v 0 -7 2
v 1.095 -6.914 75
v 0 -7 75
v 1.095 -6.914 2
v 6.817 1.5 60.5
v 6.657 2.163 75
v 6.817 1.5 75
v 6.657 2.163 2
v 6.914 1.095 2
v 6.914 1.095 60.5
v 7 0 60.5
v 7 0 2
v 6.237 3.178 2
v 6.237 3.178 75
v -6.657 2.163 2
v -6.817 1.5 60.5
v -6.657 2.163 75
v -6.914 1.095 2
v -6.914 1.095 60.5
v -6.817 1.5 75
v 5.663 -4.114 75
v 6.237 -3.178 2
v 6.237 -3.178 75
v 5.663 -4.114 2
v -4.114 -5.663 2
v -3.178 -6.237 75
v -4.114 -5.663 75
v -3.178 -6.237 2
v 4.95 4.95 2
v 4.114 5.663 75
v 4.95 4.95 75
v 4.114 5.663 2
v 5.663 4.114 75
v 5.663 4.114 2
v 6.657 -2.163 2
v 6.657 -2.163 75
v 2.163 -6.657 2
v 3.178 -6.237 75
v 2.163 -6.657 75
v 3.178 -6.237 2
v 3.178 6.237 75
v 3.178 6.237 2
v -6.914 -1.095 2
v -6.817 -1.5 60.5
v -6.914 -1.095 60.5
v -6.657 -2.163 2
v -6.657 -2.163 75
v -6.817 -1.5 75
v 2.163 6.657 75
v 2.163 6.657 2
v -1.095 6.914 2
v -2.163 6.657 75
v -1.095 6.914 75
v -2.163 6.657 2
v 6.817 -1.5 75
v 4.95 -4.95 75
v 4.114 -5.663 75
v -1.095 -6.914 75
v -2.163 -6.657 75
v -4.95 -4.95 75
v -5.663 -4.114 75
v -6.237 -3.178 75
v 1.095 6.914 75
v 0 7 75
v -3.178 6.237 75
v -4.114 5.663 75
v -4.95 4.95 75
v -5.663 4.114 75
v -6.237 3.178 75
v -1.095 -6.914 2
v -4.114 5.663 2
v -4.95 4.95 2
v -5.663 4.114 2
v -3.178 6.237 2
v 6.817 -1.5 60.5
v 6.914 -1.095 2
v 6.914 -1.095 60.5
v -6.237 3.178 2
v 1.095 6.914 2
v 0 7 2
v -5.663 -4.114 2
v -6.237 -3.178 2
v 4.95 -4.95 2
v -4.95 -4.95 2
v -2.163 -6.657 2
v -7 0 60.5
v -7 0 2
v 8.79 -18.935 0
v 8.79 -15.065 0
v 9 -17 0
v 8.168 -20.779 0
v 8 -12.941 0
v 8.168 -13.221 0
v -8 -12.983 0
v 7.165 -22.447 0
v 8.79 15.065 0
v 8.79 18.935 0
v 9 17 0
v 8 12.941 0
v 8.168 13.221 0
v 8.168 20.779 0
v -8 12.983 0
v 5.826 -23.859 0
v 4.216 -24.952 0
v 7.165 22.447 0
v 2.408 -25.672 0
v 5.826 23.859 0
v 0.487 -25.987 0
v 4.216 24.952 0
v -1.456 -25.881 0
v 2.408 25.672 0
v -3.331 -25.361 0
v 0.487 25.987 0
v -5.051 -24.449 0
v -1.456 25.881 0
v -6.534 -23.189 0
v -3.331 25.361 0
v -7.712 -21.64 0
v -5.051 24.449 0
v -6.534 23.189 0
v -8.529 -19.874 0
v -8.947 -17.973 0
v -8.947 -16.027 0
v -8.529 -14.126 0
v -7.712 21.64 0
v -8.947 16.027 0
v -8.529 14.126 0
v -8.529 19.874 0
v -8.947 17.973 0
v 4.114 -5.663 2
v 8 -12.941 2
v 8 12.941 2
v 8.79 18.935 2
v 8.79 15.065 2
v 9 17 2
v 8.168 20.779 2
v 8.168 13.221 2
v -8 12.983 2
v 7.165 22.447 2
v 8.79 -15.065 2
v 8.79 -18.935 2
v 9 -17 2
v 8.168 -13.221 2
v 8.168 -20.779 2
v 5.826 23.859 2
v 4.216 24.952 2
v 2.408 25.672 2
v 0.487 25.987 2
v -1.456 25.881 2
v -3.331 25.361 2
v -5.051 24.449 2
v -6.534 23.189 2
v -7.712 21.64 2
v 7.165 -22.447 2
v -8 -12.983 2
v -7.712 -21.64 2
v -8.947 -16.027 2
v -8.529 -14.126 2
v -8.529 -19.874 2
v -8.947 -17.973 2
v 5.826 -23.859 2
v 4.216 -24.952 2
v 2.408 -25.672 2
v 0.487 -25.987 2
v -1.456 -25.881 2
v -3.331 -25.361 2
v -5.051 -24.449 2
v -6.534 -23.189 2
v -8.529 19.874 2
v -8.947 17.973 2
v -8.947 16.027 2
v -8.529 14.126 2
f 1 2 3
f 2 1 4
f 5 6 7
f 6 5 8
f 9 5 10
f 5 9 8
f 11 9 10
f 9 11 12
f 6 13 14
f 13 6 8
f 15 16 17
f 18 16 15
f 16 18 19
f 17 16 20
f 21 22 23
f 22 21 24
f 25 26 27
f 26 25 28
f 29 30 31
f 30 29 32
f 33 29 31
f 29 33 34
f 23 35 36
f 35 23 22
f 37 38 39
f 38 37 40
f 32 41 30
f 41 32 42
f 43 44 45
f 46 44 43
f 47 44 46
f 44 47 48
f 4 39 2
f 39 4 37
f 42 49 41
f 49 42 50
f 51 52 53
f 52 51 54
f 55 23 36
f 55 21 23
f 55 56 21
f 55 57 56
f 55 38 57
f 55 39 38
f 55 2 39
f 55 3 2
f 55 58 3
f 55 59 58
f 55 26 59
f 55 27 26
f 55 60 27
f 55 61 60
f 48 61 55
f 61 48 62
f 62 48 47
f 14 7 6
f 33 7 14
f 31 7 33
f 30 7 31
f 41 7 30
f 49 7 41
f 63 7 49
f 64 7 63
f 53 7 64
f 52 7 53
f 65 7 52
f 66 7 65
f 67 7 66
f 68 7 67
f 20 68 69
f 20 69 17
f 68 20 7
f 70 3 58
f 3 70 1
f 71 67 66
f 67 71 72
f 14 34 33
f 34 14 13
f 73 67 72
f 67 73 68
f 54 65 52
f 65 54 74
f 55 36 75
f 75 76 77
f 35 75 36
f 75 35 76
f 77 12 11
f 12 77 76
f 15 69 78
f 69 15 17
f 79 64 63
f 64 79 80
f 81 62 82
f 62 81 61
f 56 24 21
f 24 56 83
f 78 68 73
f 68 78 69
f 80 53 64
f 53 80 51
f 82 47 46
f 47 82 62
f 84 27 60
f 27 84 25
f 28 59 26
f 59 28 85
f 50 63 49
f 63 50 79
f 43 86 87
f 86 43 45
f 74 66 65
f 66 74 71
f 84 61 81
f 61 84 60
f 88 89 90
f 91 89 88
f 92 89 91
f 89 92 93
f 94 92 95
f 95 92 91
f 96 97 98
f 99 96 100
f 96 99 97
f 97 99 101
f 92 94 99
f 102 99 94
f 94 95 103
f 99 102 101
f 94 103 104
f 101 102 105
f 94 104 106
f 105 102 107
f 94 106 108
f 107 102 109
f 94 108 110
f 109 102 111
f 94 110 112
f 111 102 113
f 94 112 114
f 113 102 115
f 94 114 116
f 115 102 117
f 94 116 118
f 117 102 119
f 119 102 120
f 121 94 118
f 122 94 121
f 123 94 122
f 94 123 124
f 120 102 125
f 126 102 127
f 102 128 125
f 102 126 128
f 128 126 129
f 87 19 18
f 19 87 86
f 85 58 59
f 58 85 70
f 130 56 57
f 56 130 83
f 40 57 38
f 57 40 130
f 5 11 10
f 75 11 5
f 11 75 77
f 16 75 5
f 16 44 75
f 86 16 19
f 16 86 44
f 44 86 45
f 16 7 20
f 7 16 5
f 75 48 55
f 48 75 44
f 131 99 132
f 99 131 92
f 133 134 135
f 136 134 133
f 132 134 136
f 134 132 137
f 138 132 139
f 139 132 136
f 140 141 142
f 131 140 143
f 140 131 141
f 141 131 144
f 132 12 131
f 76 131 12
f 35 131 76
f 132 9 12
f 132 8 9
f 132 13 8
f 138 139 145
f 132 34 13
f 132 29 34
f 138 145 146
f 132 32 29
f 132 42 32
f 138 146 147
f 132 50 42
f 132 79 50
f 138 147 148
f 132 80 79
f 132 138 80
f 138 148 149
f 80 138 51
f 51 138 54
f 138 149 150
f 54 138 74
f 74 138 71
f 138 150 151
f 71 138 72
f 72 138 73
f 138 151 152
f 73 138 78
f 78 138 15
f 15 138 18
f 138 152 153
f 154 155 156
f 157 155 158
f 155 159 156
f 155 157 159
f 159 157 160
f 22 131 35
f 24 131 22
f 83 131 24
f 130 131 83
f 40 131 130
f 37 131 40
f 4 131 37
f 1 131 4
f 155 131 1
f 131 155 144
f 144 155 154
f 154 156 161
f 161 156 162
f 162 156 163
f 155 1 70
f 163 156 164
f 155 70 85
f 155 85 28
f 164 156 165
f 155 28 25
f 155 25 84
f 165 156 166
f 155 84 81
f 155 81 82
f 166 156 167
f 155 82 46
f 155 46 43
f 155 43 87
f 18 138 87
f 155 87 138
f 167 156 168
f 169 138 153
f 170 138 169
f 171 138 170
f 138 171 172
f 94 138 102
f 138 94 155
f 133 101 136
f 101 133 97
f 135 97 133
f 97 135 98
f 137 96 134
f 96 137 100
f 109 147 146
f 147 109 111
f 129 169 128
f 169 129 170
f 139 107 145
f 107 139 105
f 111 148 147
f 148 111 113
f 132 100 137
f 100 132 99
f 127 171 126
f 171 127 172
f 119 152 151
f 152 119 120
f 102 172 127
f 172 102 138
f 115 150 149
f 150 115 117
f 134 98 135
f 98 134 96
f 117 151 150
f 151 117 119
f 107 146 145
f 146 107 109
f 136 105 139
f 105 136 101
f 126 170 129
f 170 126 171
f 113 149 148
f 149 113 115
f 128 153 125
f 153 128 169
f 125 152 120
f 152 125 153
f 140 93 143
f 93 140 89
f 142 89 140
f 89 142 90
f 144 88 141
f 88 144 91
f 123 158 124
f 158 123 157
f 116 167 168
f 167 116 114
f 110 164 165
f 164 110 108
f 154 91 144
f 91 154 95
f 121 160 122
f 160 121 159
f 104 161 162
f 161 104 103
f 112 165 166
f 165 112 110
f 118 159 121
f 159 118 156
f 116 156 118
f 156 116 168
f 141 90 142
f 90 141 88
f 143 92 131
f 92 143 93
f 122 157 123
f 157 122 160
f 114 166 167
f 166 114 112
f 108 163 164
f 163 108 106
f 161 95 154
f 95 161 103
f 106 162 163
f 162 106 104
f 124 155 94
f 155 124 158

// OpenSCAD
//Height of plug follower, if base is generated this height includes the base
plug_follower_height = 75;
//Diameter of plug follower
plug_follower_diameter = 14;
//Generate base plate, 0 = no base, 1 = base
generate_base = 1;
//Height of Base, 2mm default
base_height = 2;
//Type of follower 1 = center notch, 2 = Half moon, 3 = Hollow
plug_follower_type = 1;
//Determines width of notch for type 1 followers and width of keyway for type 3 followers
notch_width = 3;
//Determines depth of reccess for all types
notch_depth = 15;

module plug_notch(){
    translate([0,0,plug_follower_height+1-notch_depth+(notch_depth/2)]) cube([plug_follower_diameter+2,notch_width,notch_depth+1],center=true);
}

module plug_moon(){
    translate([0,(plug_follower_diameter/2)/2,plug_follower_height+1-notch_depth+(notch_depth/2)]) cube([plug_follower_diameter+2,plug_follower_diameter/2,notch_depth+1],center=true);
}

module plug_hollow(){
    translate([0,0,plug_follower_height-notch_depth]) cylinder(r=(plug_follower_diameter-1)/2,h=notch_depth+1,$fn=40);
    
    translate([(plug_follower_diameter-1)/2,0,(plug_follower_height-notch_depth)+(notch_depth/2)+1]) cube([notch_width,notch_width,notch_depth+1],center=true);
}

module make_base(){
translate([0,0,base_height/2]) cube([plug_follower_diameter + 2, plug_follower_diameter + 20, base_height],center=true);
translate([0,(plug_follower_diameter + 20)/2,0]) cylinder(r=(plug_follower_diameter + 4)/2,h=base_height);
translate([0,-((plug_follower_diameter + 20)/2),0]) cylinder(r=(plug_follower_diameter + 4)/2,h=base_height);
}

difference(){
cylinder(r=plug_follower_diameter/2,plug_follower_height,$fn=40);

if (plug_follower_type==1) plug_notch();
if (plug_follower_type==2) plug_moon();
if (plug_follower_type==3) plug_hollow();
}

if (generate_base==1) make_base();
 
